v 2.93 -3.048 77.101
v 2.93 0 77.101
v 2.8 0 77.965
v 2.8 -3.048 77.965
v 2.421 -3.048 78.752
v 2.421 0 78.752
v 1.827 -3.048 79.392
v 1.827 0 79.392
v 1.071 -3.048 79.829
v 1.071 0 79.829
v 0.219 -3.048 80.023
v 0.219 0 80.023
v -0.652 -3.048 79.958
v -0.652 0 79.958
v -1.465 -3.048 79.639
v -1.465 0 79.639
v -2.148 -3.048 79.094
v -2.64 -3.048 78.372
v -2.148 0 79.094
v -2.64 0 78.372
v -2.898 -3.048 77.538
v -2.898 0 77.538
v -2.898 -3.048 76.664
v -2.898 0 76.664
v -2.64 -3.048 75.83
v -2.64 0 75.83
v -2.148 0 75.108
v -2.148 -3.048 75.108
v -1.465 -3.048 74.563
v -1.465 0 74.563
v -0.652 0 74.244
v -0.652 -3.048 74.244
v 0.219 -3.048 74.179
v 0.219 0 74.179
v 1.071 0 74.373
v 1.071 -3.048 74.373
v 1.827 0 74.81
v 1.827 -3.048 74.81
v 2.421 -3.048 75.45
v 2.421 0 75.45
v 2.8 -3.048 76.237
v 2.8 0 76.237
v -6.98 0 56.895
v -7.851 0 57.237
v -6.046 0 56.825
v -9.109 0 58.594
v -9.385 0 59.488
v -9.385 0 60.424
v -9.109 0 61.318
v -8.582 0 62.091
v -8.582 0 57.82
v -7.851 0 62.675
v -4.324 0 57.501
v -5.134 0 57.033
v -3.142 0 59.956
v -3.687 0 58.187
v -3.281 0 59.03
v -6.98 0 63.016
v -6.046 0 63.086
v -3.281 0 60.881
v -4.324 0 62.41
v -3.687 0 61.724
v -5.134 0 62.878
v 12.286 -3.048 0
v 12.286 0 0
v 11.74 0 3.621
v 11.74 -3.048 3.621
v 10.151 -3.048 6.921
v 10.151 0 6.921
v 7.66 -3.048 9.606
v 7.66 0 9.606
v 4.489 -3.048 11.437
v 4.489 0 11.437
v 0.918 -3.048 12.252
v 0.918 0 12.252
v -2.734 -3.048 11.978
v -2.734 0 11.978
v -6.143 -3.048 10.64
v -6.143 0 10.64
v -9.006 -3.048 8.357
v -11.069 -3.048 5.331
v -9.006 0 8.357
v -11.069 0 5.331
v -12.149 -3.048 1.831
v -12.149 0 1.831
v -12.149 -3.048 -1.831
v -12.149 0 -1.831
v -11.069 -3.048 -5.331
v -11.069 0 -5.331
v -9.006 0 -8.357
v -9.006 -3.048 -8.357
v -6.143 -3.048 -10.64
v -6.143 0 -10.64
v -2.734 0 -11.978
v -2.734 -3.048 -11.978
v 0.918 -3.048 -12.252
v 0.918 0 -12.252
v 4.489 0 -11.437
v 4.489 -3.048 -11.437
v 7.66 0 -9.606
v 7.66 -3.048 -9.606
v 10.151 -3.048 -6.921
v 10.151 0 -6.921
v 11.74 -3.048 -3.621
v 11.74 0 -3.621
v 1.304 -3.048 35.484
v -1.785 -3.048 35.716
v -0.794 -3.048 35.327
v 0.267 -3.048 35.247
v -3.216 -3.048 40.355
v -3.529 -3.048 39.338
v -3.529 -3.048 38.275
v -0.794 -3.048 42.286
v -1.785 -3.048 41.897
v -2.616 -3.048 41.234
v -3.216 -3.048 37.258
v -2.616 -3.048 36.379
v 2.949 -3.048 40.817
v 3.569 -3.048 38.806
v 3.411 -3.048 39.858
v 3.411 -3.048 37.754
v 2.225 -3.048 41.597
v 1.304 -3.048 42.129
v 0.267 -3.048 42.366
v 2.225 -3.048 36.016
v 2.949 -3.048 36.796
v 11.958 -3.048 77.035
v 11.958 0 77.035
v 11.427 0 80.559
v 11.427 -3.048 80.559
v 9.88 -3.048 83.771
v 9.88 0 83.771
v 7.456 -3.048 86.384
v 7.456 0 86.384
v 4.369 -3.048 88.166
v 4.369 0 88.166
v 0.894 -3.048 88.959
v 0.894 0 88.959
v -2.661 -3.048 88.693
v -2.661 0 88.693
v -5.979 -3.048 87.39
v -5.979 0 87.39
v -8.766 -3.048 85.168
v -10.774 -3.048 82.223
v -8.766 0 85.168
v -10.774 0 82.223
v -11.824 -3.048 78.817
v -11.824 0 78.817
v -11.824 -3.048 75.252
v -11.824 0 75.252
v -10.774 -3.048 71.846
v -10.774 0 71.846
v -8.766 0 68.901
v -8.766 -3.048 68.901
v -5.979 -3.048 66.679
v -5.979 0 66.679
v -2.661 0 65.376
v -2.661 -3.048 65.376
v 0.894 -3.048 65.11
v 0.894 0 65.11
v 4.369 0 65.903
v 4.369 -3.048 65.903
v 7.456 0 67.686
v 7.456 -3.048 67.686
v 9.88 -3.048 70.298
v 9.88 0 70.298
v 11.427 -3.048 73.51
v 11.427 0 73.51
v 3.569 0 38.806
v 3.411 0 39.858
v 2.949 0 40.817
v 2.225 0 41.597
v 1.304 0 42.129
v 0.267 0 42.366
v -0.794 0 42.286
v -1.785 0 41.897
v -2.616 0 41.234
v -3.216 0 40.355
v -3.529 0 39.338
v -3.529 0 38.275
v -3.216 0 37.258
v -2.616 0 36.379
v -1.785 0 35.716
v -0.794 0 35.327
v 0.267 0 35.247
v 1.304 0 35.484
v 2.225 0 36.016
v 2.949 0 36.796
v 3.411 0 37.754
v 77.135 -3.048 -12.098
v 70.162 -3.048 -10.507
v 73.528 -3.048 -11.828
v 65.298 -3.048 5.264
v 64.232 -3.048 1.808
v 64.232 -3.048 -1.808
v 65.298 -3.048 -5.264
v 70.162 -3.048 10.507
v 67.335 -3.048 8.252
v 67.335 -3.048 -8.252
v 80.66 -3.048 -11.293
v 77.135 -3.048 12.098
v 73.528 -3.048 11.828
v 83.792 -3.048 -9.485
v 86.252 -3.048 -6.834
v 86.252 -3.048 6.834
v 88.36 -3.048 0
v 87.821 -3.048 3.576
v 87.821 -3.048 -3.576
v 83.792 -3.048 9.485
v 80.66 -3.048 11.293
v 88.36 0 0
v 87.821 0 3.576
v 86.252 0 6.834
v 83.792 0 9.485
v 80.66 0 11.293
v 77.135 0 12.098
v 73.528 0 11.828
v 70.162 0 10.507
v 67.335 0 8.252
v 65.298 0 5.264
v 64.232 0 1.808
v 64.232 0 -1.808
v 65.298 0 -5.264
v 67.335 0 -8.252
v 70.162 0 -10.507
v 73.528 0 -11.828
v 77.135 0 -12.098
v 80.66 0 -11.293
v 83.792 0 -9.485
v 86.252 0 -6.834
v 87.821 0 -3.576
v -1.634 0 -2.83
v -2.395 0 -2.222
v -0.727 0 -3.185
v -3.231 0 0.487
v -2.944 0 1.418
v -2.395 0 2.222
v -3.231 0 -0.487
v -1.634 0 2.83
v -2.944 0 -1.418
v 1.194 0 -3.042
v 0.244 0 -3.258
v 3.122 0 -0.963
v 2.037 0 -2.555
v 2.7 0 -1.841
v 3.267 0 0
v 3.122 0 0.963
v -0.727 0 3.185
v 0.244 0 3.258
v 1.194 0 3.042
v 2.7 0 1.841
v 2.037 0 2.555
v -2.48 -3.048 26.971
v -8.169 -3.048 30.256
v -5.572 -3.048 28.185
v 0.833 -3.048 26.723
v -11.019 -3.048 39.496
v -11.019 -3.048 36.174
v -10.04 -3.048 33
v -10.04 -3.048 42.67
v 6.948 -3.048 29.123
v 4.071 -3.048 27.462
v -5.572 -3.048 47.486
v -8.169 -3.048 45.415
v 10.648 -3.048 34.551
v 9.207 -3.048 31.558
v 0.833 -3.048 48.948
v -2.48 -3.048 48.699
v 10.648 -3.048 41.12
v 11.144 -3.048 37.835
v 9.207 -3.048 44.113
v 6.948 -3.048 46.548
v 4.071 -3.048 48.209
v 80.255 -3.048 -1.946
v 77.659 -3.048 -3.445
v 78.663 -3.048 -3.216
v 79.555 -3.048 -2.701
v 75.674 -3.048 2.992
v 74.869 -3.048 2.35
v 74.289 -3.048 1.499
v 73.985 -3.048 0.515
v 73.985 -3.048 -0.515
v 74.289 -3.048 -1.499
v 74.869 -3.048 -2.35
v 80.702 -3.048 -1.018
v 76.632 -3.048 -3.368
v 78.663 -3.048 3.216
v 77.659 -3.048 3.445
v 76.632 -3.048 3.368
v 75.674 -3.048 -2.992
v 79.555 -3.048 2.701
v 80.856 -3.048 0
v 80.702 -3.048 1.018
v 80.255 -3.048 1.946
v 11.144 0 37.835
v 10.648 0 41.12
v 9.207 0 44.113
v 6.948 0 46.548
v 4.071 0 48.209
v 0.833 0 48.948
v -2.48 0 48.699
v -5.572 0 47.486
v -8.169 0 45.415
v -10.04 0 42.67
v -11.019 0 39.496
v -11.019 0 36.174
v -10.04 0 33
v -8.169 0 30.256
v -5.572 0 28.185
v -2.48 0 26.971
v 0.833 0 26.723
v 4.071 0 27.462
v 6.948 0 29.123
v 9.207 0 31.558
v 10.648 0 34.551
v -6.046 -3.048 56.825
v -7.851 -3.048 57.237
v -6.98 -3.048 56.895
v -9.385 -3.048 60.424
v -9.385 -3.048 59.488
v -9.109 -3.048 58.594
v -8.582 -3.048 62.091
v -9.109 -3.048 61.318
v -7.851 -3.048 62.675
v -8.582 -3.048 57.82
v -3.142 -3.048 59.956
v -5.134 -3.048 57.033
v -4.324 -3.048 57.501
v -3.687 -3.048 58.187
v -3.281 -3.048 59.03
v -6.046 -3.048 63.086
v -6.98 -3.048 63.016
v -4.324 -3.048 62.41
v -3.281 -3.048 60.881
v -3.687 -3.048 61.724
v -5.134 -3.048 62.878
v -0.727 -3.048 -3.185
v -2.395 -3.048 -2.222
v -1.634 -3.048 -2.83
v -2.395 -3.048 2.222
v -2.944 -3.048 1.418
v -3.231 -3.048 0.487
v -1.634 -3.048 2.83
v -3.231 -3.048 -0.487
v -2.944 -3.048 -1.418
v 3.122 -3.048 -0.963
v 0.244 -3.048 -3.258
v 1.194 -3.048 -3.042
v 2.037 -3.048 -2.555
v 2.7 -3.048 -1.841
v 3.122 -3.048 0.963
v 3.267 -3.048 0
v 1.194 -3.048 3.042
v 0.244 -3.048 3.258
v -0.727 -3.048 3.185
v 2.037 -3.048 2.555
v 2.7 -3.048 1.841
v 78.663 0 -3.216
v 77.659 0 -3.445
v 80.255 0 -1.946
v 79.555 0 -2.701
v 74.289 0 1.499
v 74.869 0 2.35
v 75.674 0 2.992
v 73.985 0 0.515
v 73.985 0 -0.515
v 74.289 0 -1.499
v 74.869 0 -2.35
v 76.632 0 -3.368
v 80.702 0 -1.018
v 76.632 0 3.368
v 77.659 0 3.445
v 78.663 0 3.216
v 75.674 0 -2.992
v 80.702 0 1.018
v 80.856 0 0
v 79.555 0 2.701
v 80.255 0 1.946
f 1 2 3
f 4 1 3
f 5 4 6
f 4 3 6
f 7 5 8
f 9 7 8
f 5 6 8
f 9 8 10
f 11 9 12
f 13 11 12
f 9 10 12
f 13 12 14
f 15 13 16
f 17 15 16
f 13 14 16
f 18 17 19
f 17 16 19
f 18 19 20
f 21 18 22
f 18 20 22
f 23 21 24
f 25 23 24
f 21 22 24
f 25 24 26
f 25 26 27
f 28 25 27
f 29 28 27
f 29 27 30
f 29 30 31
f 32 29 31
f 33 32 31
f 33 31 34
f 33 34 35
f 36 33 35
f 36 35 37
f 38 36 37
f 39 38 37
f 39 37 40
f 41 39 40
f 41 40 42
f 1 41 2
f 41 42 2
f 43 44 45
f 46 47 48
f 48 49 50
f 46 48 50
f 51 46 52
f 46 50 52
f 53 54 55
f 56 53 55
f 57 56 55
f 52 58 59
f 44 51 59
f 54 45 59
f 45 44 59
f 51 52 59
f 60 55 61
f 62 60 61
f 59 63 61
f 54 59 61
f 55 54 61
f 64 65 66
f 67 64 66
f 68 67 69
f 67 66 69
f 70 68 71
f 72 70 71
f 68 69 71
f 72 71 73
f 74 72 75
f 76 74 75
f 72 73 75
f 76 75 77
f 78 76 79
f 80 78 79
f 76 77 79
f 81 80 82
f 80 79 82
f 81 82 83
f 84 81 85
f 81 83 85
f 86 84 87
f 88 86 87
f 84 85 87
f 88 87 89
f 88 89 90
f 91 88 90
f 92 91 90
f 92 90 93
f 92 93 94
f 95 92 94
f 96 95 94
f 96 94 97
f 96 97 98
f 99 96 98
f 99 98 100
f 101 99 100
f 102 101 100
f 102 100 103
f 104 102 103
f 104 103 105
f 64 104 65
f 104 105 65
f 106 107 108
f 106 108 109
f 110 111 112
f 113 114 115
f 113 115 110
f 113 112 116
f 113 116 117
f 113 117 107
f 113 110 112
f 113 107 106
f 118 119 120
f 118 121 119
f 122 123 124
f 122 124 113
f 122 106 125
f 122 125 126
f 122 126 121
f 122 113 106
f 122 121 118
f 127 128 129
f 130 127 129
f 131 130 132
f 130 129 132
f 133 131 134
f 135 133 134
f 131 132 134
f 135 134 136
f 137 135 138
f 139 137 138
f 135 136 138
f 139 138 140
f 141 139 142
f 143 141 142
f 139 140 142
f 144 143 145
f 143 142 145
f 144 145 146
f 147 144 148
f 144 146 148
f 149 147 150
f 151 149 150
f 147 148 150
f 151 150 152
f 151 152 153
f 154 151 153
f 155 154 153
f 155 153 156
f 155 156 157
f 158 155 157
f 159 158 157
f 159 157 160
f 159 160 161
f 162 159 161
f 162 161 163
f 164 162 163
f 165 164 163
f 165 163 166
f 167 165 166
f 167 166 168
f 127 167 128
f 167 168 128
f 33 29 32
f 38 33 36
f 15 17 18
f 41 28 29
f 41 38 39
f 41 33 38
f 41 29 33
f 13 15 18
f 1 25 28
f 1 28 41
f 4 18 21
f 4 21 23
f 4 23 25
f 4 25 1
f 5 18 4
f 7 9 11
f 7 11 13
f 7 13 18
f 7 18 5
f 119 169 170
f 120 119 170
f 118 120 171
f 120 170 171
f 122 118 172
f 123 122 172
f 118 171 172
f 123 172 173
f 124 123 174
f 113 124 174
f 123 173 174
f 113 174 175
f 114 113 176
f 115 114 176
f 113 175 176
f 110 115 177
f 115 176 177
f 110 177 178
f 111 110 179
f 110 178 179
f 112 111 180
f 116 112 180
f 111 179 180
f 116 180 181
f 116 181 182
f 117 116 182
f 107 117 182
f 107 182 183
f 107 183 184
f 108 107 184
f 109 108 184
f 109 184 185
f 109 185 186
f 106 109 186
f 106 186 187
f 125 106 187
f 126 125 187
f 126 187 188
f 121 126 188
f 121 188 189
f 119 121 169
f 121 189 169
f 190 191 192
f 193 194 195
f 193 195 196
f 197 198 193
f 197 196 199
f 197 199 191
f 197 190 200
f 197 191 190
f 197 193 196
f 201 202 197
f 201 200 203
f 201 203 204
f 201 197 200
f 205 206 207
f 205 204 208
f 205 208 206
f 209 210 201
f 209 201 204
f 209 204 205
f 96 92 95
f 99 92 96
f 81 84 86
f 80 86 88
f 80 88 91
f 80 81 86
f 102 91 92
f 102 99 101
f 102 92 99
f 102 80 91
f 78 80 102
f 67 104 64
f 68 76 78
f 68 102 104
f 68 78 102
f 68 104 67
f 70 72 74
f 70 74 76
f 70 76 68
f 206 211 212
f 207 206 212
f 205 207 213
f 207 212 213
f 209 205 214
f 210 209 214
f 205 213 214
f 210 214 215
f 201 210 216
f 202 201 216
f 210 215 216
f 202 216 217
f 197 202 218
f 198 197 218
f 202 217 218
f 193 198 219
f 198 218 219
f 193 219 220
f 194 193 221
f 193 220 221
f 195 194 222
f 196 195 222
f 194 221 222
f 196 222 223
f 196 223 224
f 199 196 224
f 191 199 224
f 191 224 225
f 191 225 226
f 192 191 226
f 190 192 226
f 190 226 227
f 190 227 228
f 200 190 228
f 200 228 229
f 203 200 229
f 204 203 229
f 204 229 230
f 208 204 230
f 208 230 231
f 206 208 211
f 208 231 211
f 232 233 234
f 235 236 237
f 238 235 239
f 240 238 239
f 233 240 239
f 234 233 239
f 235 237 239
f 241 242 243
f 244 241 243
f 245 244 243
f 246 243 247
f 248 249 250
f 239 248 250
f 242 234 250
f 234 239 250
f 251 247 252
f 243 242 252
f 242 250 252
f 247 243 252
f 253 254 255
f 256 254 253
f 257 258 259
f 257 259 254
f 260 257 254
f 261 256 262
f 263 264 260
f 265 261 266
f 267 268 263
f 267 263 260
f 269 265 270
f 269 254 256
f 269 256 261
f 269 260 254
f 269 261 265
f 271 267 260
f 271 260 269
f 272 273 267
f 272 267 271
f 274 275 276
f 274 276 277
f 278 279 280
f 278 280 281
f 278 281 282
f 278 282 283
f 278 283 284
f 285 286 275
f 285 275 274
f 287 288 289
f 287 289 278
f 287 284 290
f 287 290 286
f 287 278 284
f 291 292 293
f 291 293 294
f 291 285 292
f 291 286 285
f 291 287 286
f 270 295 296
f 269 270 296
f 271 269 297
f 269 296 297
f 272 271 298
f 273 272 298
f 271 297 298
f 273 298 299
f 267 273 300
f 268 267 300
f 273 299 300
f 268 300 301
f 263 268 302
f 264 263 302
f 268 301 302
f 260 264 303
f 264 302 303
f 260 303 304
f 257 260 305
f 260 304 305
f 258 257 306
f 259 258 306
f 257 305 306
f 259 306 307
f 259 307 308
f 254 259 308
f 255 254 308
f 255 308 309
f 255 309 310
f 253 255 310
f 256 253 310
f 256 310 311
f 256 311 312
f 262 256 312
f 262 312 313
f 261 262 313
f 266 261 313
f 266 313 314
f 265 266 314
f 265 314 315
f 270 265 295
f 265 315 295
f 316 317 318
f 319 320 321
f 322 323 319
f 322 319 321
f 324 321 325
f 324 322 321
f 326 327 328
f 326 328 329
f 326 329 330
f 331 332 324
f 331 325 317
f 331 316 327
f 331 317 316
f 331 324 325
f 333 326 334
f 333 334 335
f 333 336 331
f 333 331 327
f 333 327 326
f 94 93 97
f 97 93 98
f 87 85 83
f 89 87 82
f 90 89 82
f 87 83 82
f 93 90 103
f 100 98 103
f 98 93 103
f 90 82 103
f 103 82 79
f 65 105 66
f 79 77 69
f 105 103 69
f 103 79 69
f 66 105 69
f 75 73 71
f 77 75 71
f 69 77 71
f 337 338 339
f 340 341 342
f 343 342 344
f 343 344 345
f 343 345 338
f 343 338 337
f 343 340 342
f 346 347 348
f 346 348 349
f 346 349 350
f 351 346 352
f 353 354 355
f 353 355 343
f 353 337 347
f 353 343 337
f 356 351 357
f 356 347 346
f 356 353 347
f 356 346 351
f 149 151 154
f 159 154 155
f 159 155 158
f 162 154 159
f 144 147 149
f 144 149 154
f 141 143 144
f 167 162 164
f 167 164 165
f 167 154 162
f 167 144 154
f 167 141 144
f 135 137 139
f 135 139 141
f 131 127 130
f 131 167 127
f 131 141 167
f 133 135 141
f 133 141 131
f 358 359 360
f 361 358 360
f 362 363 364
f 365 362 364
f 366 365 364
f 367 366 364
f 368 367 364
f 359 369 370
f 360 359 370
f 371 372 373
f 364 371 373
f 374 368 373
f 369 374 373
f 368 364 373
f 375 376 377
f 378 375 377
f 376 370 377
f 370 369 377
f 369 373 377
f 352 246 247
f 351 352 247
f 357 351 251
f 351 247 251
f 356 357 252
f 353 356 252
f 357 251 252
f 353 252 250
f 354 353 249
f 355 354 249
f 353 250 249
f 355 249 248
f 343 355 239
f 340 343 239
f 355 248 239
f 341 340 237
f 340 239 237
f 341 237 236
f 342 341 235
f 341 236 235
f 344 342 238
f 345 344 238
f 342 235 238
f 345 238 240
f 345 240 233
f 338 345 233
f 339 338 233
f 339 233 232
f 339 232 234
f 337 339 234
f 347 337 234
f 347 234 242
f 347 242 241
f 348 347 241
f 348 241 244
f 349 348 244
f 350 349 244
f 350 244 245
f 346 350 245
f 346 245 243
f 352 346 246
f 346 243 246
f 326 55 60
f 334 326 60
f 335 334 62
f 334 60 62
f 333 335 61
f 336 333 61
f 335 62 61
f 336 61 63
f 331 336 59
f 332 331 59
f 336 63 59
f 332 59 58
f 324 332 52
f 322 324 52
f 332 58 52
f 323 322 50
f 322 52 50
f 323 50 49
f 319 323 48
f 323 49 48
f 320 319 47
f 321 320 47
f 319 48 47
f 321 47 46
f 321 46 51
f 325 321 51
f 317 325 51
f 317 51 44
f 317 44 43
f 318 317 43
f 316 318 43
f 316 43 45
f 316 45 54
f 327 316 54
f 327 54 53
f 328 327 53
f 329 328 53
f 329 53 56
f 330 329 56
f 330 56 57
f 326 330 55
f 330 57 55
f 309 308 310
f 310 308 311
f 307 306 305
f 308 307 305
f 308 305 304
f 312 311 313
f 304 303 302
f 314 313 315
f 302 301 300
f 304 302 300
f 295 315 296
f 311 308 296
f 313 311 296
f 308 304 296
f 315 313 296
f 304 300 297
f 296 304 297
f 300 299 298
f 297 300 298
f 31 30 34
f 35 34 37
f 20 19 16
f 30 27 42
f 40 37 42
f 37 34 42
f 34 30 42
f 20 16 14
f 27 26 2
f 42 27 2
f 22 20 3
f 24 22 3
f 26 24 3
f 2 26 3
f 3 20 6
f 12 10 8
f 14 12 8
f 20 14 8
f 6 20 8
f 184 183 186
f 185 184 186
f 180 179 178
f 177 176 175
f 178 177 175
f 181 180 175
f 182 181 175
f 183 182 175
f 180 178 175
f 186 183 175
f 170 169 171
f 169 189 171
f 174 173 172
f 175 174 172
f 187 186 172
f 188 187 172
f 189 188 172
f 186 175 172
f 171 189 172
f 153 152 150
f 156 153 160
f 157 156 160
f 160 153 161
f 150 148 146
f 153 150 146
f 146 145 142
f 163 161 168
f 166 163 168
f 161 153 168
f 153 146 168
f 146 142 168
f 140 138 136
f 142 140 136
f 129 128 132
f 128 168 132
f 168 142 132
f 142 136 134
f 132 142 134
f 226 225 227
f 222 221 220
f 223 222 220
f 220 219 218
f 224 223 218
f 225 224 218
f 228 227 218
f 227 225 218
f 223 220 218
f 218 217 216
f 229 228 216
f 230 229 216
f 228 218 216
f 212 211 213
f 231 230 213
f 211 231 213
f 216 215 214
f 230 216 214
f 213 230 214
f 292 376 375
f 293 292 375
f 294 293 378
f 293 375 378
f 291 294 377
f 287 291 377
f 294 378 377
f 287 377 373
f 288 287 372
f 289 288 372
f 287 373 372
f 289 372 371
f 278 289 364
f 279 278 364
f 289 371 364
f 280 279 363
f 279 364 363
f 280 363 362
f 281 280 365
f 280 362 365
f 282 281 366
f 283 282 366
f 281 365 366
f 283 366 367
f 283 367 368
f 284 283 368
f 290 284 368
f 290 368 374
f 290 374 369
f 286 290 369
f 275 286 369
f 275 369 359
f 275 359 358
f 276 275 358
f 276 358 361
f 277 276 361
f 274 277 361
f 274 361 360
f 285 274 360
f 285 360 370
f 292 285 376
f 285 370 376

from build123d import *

# Parameters (mm, degrees)
F0_R     = 12.286097
F5_DEPTH = 3.048
F1_R     = 11.143561
F6_DEPTH = 3.048
F2_R     = 11.957844
F7_DEPTH = 3.048
F3_R     = 12.132038
F8_DEPTH = 3.048
F4_R     = 2.930383
F4_R_2   = 3.569081
F4_R_3   = 3.267377
F4_R_4   = 3.454588
F4_R_5   = 3.139402
F9_DEPTH = 3.048


with BuildPart() as f5:
    # F0 (on Front) → F5 (new body)
    with BuildSketch(Plane.XZ):
        Circle(F0_R)
    extrude(amount=F5_DEPTH)


with BuildPart() as f6:
    # F1 (on Front) → F6 (new body)
    with BuildSketch(Plane.XZ):
        with Locations((0, 37.835278)):
            Circle(F1_R)
    extrude(amount=F6_DEPTH)


with BuildPart() as f7:
    # F2 (on Front) → F7 (new body)
    with BuildSketch(Plane.XZ):
        with Locations((0, 77.034526)):
            Circle(F2_R)
    extrude(amount=F7_DEPTH)


with BuildPart() as f8:
    # F3 (on Front) → F8 (new body)
    with BuildSketch(Plane.XZ):
        with Locations((76.228119, 0)):
            Circle(F3_R)
    extrude(amount=F8_DEPTH)


with BuildPart() as f9:
    # F4 (on Front) → F9 (new body)
    with BuildSketch(Plane.XZ):
        with Locations((0, 77.101022)):
            Circle(F4_R)
        with Locations((0, 38.806487)):
            Circle(F4_R_2)
        Circle(F4_R_3)
        with Locations((77.401124, 0)):
            Circle(F4_R_4)
        with Locations((-6.280935, 59.955794)):
            Circle(F4_R_5)
    extrude(amount=F9_DEPTH)


solid = Compound([f5.part, f6.part, f7.part, f8.part, f9.part])
